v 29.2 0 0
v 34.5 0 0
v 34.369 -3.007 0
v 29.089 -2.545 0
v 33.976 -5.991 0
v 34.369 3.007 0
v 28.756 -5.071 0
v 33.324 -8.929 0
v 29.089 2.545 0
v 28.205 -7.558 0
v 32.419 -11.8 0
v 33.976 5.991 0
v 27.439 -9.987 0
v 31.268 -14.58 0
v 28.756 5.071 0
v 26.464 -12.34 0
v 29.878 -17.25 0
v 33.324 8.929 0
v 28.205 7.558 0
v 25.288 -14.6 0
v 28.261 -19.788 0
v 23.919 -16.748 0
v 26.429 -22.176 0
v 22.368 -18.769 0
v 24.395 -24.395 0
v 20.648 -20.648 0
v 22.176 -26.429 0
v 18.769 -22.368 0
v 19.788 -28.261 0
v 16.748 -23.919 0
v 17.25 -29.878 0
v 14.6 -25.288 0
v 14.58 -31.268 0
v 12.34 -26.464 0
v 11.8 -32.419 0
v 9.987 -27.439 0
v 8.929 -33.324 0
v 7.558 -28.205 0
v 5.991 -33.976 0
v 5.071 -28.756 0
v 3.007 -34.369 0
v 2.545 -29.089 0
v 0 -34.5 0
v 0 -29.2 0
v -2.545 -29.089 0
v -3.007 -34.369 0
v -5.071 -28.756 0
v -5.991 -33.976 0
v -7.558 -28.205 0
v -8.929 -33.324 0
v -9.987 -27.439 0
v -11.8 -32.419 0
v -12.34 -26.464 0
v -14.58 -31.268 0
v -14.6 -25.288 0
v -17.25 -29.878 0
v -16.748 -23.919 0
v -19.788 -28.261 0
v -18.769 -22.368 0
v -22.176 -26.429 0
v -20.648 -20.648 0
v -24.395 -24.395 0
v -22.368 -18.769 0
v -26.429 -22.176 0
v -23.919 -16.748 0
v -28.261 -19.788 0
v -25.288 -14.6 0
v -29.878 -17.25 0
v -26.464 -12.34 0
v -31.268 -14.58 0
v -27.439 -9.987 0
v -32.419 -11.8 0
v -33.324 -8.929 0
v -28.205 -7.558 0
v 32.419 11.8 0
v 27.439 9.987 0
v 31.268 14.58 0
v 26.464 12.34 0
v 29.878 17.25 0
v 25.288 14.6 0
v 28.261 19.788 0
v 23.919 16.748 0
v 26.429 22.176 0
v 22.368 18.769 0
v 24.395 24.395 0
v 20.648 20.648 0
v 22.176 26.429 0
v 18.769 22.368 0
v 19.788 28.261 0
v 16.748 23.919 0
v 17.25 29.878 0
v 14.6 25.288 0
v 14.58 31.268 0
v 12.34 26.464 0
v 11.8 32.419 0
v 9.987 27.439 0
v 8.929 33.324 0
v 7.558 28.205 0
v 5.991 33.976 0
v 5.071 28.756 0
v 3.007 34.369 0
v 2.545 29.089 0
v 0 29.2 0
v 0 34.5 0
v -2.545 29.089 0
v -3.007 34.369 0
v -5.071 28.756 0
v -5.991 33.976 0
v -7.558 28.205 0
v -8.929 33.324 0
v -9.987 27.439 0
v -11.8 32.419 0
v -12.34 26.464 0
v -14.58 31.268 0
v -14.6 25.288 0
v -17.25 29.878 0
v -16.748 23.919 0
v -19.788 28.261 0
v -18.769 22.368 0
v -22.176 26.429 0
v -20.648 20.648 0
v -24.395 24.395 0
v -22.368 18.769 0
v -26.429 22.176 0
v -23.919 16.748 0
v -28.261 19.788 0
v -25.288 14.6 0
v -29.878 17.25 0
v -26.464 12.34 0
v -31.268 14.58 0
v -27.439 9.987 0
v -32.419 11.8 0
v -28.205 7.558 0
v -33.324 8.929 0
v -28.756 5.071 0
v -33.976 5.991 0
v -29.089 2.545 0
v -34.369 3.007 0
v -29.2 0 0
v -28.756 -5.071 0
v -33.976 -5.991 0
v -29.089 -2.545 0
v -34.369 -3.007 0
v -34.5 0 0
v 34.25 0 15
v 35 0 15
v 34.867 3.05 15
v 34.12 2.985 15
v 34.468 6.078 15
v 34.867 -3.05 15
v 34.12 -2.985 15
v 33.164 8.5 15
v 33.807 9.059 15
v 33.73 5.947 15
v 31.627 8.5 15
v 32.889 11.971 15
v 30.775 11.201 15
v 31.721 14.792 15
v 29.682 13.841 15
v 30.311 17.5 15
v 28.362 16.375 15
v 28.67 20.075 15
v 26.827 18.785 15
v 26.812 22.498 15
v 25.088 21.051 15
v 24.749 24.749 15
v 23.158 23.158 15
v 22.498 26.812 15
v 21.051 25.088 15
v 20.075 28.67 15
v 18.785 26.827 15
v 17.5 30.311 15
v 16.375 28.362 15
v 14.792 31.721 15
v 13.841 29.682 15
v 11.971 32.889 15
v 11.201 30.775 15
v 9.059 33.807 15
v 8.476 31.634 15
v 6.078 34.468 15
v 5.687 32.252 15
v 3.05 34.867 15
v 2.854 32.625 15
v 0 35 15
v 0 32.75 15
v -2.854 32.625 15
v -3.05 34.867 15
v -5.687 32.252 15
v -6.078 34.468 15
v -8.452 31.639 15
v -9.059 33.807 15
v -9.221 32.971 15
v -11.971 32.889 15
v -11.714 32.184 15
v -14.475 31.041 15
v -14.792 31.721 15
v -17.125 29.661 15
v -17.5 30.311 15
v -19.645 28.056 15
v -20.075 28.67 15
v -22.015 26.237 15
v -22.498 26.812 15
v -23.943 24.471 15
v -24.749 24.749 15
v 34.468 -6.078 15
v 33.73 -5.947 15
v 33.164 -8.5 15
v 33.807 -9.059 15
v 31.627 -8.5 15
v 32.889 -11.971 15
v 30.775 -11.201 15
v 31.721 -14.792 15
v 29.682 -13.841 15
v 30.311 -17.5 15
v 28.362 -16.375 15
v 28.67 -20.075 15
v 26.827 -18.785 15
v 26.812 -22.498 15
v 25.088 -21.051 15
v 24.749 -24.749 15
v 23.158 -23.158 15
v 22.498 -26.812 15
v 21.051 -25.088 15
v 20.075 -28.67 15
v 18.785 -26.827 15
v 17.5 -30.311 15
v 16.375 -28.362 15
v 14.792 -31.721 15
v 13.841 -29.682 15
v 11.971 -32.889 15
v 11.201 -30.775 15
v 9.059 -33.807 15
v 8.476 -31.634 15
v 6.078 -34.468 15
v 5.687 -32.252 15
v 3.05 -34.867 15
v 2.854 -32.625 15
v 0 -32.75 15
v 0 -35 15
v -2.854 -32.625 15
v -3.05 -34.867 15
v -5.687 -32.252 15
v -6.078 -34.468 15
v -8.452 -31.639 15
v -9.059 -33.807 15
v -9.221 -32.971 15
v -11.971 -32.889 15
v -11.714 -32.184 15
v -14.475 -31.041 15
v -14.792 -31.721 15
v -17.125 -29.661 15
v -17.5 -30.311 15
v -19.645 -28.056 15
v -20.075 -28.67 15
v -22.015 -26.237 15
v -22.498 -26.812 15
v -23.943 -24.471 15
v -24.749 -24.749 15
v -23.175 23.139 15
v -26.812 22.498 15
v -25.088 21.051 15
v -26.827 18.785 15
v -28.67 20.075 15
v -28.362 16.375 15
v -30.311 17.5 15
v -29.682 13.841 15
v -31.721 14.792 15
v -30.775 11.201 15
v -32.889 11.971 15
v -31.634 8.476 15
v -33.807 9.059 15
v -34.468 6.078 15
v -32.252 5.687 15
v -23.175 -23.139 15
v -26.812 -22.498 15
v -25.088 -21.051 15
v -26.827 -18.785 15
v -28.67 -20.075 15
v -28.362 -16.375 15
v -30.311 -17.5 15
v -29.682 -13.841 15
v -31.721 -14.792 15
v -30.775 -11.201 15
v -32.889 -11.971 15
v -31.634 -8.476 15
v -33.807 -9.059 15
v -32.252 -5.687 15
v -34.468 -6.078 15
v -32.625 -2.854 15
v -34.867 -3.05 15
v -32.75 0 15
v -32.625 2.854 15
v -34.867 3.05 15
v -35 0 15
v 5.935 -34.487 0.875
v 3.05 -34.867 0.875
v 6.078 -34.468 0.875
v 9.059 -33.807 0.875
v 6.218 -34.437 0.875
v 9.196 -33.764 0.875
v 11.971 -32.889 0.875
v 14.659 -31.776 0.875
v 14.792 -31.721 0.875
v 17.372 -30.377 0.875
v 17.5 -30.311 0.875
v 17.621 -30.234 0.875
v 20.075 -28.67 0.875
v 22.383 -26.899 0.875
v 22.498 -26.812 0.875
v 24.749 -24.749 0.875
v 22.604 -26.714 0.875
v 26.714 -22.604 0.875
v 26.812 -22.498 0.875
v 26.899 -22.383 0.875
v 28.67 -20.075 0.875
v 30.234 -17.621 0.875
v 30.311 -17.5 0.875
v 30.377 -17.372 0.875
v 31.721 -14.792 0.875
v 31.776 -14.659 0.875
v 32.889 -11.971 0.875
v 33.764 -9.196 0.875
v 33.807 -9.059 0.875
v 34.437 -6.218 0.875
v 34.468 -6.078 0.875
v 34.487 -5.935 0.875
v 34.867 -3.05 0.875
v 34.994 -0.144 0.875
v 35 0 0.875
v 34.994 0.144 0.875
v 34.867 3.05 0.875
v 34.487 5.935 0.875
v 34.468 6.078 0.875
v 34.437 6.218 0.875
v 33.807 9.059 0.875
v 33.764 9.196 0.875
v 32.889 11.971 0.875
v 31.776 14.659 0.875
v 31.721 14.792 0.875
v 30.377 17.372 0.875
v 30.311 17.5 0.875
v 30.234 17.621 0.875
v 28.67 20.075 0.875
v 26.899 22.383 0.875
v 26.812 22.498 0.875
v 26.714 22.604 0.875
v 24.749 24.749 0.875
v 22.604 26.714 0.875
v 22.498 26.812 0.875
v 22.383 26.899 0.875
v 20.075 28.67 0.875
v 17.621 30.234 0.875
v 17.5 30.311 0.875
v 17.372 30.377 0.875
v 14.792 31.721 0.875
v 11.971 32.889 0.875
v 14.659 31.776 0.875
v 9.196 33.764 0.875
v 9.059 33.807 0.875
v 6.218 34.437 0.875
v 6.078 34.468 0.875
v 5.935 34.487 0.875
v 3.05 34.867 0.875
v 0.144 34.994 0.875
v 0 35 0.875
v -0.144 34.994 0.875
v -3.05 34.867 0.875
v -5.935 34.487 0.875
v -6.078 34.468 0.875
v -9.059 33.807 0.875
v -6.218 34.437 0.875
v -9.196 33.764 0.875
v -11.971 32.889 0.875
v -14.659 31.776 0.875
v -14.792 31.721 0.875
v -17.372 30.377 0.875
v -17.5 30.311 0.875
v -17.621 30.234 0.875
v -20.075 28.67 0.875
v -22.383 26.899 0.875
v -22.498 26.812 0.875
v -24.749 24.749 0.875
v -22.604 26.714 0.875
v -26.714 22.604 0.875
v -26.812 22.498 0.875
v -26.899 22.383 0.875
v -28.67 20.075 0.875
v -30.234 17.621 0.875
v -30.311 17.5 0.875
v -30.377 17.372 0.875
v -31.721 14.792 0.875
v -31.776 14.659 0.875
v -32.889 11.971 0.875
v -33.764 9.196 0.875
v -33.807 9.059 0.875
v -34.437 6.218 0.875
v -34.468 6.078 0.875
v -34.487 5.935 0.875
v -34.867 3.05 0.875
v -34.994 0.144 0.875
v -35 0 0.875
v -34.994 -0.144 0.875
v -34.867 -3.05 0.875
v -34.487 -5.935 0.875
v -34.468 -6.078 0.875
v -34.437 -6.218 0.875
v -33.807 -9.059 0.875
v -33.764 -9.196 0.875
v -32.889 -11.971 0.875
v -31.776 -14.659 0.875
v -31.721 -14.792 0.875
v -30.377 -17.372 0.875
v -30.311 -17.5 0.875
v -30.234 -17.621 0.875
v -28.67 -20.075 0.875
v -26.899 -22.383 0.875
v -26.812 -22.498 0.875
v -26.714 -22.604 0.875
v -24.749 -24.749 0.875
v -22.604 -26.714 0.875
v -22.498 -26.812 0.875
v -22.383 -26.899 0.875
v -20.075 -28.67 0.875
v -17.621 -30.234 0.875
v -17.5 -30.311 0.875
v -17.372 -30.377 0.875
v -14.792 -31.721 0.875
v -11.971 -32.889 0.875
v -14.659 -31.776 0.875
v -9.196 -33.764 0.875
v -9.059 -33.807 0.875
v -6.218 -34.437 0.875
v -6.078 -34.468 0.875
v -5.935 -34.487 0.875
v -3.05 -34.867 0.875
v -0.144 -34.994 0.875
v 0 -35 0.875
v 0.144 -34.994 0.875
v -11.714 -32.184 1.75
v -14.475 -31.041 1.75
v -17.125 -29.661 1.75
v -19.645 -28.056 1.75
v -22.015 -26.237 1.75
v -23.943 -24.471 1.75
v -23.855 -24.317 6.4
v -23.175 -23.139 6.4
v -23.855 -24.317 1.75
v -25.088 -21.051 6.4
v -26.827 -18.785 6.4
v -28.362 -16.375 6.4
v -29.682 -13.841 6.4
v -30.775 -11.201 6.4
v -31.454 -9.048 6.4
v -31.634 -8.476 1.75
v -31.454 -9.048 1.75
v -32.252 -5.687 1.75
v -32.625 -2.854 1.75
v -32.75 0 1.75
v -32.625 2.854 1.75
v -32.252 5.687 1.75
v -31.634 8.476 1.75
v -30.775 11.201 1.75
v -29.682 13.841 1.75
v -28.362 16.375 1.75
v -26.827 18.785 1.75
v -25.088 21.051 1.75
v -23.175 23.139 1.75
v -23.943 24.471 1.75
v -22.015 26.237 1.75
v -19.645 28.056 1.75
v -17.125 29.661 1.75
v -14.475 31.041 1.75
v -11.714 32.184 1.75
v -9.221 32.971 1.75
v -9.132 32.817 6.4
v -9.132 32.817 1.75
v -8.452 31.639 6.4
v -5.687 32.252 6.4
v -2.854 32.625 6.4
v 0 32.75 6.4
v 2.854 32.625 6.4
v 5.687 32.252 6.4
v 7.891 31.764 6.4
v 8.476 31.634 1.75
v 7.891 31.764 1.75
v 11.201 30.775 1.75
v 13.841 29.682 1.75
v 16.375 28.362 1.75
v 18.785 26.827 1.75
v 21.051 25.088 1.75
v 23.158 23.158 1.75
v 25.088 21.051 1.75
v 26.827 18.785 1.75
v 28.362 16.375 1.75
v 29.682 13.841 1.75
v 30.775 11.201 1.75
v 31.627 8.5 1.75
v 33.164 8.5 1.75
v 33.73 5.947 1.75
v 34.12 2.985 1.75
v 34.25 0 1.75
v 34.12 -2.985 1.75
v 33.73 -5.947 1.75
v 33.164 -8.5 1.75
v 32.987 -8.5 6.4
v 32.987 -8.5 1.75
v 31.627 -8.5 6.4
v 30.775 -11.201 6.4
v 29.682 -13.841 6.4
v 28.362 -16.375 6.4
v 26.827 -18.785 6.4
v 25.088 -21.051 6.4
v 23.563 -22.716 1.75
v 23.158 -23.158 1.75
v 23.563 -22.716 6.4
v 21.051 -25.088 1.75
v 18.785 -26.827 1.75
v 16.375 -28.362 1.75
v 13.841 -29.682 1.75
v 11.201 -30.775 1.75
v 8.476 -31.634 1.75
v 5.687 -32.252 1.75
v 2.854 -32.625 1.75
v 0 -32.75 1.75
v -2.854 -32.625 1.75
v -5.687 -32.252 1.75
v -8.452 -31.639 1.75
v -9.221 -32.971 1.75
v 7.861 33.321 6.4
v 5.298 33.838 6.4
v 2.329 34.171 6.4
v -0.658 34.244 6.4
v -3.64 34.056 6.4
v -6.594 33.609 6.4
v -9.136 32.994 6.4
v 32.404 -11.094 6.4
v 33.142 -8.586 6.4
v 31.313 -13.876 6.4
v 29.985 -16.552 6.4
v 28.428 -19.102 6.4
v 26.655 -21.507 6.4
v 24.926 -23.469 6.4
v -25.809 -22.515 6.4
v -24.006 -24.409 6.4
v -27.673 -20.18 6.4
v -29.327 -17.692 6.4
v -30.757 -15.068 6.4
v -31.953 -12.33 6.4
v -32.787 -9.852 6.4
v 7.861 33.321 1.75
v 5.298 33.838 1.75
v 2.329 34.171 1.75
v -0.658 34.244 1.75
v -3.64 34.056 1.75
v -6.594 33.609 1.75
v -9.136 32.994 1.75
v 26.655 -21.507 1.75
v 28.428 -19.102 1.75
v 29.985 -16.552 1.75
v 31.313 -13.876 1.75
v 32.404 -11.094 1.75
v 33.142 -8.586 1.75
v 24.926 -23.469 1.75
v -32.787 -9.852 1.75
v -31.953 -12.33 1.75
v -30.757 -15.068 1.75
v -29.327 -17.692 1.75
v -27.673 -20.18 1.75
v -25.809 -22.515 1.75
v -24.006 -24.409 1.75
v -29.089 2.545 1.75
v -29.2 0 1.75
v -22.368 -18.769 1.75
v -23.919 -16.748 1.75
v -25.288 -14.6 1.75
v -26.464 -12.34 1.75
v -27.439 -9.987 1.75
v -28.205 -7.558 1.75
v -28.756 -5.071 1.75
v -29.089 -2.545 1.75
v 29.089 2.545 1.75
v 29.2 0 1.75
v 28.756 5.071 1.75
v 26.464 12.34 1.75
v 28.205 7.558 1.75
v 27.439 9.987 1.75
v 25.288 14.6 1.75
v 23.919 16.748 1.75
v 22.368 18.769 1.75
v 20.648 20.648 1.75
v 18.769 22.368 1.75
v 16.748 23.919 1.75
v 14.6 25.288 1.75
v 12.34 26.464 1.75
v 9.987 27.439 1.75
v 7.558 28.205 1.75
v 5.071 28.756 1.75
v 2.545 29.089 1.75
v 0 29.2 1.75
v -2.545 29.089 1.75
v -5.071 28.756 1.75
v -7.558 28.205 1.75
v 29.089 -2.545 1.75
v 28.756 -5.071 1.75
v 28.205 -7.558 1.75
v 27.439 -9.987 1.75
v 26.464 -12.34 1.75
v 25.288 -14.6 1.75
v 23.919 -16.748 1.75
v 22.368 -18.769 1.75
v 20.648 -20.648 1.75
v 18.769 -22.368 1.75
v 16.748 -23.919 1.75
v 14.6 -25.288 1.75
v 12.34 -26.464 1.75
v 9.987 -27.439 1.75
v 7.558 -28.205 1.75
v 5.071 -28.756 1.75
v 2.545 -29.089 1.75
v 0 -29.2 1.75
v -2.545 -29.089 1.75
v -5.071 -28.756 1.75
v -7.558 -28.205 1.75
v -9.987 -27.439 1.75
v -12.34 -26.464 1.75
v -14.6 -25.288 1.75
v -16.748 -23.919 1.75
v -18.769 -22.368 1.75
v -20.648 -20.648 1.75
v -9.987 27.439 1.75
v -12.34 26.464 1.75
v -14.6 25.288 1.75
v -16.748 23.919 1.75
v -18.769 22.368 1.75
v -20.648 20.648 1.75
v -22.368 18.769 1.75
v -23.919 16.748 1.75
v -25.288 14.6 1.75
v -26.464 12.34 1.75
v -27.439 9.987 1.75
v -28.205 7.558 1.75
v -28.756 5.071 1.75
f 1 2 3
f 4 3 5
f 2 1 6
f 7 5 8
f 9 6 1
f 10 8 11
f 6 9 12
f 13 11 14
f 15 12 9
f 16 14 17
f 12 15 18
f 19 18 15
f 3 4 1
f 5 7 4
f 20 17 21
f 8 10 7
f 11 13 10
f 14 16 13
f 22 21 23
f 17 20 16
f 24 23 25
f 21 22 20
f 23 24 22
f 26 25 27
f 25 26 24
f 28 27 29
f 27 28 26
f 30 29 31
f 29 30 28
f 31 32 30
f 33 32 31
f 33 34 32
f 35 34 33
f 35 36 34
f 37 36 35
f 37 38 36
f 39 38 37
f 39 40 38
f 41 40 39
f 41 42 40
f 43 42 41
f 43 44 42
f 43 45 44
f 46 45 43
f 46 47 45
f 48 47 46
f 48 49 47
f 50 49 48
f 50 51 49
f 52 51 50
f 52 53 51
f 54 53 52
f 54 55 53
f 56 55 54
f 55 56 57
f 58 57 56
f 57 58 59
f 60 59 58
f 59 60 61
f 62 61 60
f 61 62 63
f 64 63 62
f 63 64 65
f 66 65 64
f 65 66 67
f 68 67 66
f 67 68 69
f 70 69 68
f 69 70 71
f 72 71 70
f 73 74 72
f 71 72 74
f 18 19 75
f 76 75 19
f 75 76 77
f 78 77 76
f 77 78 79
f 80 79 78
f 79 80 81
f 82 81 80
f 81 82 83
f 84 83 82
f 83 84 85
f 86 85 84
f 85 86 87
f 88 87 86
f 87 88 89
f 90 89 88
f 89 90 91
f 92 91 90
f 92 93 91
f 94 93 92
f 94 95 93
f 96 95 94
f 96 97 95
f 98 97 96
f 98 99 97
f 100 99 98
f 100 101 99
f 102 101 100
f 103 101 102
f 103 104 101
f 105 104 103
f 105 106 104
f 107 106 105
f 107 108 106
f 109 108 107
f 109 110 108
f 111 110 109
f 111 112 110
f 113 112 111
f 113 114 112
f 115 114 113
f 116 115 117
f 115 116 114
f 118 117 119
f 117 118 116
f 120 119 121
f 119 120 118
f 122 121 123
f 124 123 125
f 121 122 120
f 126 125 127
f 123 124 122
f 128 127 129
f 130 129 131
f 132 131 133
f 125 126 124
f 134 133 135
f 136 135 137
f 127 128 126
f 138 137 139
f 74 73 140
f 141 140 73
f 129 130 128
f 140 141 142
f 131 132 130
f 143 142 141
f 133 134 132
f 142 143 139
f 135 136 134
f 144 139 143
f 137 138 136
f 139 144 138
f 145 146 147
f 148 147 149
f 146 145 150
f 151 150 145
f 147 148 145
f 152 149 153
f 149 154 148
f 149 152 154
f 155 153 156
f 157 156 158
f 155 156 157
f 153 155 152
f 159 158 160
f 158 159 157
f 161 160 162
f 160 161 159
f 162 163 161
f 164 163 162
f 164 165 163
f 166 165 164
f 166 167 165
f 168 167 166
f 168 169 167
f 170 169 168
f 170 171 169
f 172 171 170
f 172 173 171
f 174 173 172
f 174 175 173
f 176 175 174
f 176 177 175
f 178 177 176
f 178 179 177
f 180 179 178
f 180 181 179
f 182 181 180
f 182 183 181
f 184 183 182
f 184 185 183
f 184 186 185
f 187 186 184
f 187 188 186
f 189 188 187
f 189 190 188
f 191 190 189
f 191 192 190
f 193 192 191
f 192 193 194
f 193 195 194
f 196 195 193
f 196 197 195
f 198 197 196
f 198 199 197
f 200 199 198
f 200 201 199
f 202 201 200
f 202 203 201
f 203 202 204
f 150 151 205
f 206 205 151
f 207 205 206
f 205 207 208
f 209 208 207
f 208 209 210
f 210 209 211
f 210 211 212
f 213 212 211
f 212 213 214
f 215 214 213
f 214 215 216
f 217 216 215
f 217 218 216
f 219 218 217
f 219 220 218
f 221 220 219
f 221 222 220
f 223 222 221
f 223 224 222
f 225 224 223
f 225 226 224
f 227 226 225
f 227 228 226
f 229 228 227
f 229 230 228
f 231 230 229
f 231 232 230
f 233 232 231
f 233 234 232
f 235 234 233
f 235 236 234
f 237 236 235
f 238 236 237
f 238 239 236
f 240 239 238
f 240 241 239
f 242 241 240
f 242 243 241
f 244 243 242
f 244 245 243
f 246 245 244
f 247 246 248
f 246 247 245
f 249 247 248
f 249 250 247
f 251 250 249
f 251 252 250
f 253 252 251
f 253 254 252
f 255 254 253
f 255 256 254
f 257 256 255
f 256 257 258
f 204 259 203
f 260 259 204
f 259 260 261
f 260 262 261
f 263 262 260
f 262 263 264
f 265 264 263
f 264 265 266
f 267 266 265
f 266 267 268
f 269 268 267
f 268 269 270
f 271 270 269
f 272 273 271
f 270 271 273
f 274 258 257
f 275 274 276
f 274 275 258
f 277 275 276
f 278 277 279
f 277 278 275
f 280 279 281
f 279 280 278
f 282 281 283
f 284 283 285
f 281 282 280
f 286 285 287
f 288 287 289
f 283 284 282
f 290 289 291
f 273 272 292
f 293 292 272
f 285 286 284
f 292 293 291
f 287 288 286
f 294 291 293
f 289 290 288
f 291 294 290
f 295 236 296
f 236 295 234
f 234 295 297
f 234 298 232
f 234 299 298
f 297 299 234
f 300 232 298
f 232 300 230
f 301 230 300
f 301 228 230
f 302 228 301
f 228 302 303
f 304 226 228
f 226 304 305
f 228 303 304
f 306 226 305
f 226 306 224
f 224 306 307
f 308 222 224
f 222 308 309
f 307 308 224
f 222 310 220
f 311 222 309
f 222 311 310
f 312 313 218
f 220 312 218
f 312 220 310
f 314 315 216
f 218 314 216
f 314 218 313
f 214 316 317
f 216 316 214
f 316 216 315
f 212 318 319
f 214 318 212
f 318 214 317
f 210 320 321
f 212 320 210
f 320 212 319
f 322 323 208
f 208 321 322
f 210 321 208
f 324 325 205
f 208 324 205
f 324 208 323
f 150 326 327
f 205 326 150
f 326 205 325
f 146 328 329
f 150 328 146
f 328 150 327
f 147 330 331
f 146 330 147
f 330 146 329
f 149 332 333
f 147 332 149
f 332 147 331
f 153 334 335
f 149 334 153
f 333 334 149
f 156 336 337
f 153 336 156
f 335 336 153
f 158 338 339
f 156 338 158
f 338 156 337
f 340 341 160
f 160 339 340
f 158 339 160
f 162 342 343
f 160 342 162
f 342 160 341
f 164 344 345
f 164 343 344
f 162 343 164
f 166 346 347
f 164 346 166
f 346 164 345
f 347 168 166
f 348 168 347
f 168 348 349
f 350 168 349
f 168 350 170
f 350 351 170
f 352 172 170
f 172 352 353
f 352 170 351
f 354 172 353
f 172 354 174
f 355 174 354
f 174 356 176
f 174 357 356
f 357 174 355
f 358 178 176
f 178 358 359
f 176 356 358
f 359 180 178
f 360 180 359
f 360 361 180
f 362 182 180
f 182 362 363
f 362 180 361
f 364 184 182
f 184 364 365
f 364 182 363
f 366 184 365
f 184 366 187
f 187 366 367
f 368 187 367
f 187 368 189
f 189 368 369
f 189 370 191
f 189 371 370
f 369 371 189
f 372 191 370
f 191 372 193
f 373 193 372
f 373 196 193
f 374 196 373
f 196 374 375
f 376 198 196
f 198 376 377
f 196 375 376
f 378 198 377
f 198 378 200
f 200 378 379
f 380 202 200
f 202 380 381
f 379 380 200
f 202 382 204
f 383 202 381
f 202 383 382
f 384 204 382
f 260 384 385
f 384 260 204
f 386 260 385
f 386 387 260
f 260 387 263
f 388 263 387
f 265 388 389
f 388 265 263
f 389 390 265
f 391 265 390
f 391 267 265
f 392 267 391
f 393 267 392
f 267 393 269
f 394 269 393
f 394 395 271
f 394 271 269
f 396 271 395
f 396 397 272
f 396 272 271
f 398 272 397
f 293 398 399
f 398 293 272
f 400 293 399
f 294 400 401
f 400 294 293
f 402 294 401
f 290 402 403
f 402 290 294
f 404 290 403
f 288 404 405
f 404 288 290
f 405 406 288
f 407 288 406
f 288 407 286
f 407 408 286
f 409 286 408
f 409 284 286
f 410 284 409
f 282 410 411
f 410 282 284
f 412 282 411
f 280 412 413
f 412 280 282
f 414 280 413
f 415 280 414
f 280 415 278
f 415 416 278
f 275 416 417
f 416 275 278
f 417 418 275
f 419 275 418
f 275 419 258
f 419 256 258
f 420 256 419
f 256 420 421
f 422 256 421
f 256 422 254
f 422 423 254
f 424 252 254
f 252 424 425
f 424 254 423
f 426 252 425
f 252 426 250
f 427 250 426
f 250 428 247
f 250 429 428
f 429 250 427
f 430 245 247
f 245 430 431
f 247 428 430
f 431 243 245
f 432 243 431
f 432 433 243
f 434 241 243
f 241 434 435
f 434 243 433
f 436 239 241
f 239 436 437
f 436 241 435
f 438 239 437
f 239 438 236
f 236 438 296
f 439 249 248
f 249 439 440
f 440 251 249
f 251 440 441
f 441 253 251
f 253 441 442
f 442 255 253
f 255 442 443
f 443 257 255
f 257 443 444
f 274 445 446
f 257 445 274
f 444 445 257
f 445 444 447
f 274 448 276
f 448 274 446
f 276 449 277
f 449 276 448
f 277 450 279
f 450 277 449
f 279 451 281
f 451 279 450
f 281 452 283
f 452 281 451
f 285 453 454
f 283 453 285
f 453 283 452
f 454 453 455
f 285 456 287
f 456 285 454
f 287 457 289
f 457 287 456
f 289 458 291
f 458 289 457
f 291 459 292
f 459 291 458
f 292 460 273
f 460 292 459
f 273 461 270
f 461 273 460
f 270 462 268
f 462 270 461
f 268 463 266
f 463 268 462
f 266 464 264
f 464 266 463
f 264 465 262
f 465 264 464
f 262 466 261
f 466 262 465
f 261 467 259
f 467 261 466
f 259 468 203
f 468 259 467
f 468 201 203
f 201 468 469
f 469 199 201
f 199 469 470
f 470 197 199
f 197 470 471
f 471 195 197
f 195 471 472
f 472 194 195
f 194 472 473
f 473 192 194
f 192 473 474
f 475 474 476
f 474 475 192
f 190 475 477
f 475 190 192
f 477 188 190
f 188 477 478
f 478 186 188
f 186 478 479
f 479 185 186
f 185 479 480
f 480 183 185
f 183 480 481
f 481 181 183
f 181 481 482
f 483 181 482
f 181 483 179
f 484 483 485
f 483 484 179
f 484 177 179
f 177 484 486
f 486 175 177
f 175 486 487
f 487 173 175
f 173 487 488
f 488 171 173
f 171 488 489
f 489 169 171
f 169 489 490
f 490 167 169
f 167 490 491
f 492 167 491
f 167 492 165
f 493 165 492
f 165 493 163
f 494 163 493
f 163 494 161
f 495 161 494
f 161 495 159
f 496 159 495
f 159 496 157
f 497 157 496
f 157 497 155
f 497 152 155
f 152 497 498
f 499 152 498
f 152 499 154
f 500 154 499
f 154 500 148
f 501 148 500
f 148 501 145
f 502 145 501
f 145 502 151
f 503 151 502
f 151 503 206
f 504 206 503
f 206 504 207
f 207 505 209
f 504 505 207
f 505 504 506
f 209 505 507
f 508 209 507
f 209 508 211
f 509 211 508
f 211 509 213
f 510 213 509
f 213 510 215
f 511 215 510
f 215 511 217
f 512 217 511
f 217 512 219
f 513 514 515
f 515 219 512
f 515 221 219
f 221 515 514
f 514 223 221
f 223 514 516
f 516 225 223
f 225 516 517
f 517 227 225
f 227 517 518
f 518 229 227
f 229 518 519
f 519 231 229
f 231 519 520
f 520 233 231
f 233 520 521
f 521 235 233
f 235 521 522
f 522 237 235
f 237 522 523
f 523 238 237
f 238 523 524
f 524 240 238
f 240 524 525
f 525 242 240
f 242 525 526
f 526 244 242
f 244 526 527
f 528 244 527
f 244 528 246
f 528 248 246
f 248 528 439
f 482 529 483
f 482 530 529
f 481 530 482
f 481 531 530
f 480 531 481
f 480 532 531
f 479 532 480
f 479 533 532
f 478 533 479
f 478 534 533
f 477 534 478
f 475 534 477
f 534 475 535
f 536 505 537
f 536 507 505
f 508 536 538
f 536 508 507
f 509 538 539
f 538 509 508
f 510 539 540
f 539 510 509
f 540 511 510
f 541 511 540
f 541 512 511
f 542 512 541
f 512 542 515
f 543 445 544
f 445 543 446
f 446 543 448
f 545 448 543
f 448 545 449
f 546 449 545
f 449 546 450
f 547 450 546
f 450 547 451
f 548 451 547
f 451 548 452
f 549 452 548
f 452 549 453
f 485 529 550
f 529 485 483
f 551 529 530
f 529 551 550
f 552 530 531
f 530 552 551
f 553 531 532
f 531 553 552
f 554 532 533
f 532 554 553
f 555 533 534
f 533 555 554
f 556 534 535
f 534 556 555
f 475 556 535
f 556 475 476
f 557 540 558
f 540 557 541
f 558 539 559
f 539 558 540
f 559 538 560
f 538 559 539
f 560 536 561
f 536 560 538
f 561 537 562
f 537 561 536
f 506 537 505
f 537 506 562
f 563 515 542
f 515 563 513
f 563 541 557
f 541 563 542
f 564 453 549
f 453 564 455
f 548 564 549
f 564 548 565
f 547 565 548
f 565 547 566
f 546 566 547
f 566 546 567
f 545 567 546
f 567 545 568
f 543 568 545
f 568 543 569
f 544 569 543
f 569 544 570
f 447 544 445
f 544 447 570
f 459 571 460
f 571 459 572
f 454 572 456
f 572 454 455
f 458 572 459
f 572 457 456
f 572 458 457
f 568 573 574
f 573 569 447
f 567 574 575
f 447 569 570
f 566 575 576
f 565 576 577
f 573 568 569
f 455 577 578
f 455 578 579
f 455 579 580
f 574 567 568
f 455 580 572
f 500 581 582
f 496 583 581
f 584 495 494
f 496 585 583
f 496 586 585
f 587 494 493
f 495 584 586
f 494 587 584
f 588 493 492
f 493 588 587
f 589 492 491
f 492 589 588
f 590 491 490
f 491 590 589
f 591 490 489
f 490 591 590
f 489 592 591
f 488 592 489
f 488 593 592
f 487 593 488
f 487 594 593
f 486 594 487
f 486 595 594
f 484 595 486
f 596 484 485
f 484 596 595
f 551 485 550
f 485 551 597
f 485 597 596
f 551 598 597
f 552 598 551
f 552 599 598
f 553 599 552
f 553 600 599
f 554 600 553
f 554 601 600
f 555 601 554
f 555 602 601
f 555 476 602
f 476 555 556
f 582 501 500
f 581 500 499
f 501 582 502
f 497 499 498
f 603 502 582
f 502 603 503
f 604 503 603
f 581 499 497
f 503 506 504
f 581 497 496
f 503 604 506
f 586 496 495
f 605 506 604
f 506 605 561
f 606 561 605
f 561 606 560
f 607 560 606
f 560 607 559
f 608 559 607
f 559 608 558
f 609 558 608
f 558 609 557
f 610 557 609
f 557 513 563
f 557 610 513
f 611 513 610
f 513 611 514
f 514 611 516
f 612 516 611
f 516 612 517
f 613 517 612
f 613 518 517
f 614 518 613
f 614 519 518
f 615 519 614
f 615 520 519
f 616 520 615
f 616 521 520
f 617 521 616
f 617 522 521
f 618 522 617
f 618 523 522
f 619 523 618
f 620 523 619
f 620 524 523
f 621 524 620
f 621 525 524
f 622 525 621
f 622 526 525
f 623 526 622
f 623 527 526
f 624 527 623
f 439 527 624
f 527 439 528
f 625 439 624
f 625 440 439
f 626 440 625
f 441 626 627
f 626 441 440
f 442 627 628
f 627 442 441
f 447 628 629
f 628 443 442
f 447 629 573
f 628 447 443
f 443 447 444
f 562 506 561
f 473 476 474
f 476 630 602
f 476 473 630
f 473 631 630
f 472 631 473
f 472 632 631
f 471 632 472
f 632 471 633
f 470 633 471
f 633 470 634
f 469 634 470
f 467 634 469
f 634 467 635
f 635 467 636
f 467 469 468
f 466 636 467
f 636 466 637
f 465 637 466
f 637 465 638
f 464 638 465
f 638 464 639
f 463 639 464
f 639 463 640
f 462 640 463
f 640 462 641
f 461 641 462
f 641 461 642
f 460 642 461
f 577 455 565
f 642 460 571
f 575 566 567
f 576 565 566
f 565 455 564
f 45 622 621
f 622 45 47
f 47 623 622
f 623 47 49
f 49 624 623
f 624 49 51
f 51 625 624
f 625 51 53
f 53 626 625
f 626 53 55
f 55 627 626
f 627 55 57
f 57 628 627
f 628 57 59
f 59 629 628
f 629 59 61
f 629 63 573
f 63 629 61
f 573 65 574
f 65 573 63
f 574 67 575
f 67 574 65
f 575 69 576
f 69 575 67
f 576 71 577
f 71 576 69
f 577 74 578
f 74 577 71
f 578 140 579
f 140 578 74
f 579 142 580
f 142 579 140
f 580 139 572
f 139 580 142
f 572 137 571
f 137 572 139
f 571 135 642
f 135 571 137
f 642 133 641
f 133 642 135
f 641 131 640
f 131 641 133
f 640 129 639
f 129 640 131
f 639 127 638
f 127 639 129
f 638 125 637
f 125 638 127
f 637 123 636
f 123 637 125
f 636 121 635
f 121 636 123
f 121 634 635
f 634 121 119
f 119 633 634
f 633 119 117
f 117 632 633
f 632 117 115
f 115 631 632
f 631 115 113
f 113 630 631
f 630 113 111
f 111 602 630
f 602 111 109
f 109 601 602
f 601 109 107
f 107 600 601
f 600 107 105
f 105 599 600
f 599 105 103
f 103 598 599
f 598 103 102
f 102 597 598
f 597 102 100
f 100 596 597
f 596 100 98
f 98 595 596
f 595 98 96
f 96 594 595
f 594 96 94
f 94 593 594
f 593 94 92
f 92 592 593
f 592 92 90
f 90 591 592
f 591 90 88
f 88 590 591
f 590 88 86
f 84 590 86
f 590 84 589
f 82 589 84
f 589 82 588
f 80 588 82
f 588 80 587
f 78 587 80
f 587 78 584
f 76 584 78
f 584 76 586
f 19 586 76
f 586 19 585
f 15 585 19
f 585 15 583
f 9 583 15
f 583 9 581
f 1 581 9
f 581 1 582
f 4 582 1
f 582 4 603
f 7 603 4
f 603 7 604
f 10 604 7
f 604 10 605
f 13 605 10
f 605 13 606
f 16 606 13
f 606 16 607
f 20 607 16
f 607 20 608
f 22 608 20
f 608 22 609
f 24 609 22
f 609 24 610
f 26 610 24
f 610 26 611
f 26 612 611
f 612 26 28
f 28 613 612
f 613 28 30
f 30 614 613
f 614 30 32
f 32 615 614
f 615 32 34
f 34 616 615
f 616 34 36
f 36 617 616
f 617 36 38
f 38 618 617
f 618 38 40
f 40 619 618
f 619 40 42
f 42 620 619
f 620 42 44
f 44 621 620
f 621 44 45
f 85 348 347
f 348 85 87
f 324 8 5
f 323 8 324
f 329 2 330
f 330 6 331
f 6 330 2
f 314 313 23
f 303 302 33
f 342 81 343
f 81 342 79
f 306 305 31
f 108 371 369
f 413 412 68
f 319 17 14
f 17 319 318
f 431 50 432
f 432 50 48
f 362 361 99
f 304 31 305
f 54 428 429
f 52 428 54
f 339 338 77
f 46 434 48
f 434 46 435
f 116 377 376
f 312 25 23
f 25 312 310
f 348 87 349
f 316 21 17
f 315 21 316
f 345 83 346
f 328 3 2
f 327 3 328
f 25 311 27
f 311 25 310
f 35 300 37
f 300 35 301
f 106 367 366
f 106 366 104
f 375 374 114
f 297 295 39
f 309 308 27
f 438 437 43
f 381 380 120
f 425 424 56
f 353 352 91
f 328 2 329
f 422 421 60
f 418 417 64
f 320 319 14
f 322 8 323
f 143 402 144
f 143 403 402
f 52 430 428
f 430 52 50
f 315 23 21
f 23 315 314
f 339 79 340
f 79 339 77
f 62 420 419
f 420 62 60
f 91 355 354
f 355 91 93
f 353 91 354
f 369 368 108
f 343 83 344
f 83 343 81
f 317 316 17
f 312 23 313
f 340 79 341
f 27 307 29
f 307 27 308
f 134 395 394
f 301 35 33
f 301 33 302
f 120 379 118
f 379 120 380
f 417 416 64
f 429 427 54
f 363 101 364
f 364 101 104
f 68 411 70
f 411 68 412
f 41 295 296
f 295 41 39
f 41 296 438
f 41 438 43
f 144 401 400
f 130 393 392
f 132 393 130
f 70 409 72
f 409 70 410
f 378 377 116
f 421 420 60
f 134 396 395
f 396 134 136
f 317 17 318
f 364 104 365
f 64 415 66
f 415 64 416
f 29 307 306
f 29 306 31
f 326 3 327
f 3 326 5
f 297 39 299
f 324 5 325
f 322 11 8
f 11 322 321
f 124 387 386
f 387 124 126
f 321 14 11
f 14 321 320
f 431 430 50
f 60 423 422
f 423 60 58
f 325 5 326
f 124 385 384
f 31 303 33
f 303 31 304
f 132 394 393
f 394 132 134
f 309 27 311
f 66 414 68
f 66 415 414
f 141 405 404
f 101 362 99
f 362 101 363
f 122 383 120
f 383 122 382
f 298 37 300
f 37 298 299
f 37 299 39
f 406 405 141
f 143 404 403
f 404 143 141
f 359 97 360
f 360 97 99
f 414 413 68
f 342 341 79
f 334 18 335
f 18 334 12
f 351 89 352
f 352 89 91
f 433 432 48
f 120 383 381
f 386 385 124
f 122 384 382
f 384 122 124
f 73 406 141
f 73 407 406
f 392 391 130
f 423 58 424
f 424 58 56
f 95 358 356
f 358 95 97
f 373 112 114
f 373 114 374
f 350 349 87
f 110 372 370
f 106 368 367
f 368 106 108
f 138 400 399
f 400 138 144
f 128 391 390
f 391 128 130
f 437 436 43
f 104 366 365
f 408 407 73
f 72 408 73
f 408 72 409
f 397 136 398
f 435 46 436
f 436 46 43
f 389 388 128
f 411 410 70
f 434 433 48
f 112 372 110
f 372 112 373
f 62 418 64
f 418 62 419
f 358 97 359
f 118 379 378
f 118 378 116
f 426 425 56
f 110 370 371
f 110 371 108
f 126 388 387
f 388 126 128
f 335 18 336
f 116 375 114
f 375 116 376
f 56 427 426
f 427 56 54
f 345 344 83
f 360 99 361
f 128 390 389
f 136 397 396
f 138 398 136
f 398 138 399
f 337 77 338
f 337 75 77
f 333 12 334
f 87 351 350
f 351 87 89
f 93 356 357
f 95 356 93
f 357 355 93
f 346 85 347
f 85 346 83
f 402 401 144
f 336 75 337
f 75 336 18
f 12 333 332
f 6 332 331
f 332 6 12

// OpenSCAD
inset = 5.8;
outerDiameter = 65;
tabThickness = 1.5;
innerDepth = 15;
outerDepth = 10;
tabLength = 17;
tolerance = 0.25;
minimumThickness = 0.5;
thickness = 1.75;
rotatedTabDepth = 6.4;
chamfer = 0.5;

thickness1 = max(thickness, tabThickness+minimumThickness);
diameter1 = outerDiameter + 2 * tolerance;
diameter2 = diameter1 + thickness1 * 2 + 2 * tolerance;
diameter3 = diameter2 + 2 * tolerance;
diameter4 = diameter3 + 2 * thickness;

nudge = 0.01;
$fn = 72;
tabAngle = 2 * atan2(tabLength/2, diameter1/2);

module tab() {
    intersection() {
        difference() {
            circle(d=diameter1+tabThickness*2);
            circle(d=diameter1-5);
        }
        translate([0,-tabLength/2]) square([diameter1, tabLength]);
    }
}

module innerBase() {
    difference() {
        linear_extrude(height=innerDepth)
        difference() {
            circle(d=diameter2);
            circle(d=diameter1);
            for (a=[0:120:240]) rotate(a) tab();
        }
        linear_extrude(height=rotatedTabDepth)
            for (a=[0:120:240]) rotate(a-tabAngle+0.2) tab();
    }
    linear_extrude(height=thickness)
    difference() {
        circle(d=diameter2);
        circle(d=diameter2-inset*2);
    }
}

module inner() {
    intersection() {
        innerBase();
        cylinder(d1=diameter2-2*chamfer,d2=diameter2+innerDepth*2-2*chamfer,h=innerDepth*1.75);
    }
}

module outer() {
    linear_extrude(height=outerDepth)
    difference() {
        circle(d=diameter4);
        circle(d=diameter3);
    }
    linear_extrude(height=thickness)
    difference() {
        circle(d=diameter4);
        circle(d=diameter2-inset*2);
    }
}

inner();
//translate([diameter4+5,0,0]) outer();
